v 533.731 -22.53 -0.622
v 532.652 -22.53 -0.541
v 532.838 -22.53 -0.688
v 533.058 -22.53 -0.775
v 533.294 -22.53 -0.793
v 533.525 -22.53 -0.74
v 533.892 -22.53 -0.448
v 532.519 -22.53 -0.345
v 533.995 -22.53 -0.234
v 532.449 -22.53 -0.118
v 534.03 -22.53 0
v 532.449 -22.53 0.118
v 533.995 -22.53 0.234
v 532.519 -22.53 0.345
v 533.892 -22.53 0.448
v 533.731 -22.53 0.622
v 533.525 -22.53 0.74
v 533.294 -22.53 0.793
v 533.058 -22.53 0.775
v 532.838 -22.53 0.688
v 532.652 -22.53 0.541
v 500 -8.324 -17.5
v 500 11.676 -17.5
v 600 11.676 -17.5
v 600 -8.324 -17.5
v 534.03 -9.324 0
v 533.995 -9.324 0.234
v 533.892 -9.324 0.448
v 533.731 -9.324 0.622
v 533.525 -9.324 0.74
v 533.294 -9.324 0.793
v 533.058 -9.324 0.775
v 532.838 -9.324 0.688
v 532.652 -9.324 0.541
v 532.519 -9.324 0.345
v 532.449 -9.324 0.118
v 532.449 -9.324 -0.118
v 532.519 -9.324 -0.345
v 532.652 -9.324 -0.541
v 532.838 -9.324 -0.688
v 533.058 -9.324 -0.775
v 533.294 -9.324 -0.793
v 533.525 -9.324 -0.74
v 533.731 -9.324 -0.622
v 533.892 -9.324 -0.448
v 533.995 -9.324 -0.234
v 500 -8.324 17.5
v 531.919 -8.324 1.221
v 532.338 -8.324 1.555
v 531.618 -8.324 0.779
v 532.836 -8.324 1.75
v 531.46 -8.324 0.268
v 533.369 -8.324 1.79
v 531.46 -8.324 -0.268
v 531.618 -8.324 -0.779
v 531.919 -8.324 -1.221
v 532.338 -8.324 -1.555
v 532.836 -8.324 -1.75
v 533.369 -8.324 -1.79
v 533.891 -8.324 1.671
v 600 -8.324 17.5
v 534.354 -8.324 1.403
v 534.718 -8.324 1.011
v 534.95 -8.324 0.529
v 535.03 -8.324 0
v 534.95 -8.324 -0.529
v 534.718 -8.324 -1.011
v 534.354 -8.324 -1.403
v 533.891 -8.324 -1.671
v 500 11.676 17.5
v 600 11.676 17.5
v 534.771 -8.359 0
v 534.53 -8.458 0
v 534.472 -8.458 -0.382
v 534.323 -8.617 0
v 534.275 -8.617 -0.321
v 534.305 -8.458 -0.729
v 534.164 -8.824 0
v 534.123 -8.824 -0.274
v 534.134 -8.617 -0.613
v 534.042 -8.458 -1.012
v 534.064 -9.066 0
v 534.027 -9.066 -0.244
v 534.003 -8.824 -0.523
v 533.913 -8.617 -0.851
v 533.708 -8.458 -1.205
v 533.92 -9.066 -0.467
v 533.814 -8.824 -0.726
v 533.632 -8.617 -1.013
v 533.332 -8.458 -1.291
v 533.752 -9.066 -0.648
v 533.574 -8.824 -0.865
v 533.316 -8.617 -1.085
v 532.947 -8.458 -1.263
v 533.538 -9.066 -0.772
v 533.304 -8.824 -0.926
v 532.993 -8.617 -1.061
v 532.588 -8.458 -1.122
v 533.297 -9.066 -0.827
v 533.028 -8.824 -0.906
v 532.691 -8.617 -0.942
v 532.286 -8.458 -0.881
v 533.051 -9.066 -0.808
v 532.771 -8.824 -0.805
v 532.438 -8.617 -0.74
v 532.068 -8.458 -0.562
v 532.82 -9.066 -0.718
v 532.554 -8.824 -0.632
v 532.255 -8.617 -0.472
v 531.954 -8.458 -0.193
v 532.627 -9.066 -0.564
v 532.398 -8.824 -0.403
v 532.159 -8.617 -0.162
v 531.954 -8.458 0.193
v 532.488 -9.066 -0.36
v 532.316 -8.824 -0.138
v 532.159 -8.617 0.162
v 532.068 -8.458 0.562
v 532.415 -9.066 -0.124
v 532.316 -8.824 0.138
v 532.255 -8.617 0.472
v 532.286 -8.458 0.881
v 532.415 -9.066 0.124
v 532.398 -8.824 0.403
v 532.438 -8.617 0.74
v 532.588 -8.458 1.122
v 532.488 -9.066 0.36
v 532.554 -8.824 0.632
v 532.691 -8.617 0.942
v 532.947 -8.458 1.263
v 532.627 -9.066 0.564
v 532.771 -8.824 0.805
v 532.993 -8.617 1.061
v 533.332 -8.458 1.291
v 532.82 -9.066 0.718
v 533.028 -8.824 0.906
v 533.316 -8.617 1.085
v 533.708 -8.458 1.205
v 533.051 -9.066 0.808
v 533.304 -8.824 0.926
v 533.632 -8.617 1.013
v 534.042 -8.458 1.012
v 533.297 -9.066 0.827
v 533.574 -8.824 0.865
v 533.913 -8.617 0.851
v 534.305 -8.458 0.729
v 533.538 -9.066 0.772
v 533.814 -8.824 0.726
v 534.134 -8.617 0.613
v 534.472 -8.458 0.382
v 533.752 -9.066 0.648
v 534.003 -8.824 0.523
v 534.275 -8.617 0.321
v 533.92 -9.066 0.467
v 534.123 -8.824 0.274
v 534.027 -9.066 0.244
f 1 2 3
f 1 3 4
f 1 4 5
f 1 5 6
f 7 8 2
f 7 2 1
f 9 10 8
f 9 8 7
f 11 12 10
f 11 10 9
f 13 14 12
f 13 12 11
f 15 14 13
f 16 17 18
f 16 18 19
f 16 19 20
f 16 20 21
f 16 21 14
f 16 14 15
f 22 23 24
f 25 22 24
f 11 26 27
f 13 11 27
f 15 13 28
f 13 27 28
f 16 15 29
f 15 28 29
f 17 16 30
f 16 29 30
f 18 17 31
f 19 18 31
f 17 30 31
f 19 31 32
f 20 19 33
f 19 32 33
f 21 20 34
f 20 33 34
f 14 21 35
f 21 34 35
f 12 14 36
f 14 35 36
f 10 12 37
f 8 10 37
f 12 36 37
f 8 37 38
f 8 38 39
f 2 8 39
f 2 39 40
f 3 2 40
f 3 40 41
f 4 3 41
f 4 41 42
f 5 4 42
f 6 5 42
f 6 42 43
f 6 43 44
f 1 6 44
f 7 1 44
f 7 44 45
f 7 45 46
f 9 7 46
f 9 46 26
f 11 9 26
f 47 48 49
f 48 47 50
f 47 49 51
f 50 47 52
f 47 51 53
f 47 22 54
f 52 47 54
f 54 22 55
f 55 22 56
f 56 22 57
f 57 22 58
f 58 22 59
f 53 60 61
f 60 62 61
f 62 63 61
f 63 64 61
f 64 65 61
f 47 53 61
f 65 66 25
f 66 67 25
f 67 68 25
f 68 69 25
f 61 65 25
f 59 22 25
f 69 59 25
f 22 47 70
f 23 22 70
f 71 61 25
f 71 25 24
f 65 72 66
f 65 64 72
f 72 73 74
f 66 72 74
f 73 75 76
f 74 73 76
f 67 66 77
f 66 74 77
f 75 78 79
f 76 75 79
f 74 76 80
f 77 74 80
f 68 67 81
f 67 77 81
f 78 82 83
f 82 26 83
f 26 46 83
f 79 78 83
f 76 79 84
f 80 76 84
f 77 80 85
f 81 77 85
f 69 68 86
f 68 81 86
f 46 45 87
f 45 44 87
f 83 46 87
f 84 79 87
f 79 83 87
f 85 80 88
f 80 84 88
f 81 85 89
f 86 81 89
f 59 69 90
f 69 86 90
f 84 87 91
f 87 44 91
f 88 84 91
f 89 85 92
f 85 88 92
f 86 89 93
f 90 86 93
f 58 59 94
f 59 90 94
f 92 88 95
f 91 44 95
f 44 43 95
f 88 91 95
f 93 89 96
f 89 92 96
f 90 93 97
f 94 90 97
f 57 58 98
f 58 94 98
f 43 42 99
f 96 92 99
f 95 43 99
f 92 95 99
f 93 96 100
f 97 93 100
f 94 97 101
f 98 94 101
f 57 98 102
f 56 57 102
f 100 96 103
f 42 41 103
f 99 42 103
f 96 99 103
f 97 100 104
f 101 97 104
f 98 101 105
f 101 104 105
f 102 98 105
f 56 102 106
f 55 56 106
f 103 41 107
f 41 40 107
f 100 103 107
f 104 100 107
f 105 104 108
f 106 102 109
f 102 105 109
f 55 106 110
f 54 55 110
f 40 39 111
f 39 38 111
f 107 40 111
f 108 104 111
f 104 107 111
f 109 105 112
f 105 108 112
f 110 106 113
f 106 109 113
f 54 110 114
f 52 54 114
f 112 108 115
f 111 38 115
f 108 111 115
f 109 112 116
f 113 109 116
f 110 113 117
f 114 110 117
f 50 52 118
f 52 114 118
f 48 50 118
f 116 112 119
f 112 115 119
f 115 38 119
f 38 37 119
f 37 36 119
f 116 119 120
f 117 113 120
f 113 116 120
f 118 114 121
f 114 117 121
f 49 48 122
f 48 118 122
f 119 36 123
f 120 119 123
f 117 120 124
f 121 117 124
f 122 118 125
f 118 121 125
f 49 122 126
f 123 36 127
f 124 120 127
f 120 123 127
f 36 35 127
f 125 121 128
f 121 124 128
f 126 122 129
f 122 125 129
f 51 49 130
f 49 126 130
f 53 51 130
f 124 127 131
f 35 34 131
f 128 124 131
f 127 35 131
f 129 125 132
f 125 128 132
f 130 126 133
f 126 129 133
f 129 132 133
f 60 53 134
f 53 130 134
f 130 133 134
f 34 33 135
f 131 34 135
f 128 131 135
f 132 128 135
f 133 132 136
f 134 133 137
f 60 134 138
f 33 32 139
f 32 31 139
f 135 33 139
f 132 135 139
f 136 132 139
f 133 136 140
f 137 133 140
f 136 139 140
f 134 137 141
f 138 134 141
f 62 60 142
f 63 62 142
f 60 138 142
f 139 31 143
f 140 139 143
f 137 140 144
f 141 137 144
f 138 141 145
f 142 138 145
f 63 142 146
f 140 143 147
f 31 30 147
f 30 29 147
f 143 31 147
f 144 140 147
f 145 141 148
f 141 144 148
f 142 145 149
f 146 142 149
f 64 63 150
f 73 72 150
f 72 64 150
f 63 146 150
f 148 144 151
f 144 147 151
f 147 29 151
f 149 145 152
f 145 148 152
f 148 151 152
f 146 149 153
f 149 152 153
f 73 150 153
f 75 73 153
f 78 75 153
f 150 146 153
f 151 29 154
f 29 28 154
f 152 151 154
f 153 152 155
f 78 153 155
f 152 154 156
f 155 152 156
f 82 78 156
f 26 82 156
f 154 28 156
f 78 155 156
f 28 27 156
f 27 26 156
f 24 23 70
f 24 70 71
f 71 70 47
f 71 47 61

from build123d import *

# Parameters (mm, degrees)
BOX_W             = 100
BOX_H             = 20
BOX_DEPTH         = 35
CYLINDER001_R     = 0.795
CYLINDER001_DEPTH = 15
FILLET_R          = 1


with BuildPart() as cube:
    # Box → Box (new body)
    with BuildSketch(Plane(origin=(500, -8.3245, -17.5), x_dir=(1, 0, 0), z_dir=(0, 0, 1))):
        with Locations((50, 10)):
            Rectangle(BOX_W, BOX_H)
    extrude(amount=BOX_DEPTH)


with BuildPart() as fillet_body:
    # Cylinder001 → Cylinder001 (new body)
    with BuildSketch(Plane(origin=(533.235, -7.5295, 0), x_dir=(1, 0, 0), z_dir=(0, -1, 0))):
        Circle(CYLINDER001_R)
    extrude(amount=CYLINDER001_DEPTH)

    # Fusion: union Cube
    add(cube.part)

    # Fillet
    fillet_edges = [fillet_body.edges().sort_by_distance(p)[0] for p in [
        (532.44, -8.3245, 0),
    ]]
    fillet(fillet_edges, radius=FILLET_R)


solid = fillet_body.part
